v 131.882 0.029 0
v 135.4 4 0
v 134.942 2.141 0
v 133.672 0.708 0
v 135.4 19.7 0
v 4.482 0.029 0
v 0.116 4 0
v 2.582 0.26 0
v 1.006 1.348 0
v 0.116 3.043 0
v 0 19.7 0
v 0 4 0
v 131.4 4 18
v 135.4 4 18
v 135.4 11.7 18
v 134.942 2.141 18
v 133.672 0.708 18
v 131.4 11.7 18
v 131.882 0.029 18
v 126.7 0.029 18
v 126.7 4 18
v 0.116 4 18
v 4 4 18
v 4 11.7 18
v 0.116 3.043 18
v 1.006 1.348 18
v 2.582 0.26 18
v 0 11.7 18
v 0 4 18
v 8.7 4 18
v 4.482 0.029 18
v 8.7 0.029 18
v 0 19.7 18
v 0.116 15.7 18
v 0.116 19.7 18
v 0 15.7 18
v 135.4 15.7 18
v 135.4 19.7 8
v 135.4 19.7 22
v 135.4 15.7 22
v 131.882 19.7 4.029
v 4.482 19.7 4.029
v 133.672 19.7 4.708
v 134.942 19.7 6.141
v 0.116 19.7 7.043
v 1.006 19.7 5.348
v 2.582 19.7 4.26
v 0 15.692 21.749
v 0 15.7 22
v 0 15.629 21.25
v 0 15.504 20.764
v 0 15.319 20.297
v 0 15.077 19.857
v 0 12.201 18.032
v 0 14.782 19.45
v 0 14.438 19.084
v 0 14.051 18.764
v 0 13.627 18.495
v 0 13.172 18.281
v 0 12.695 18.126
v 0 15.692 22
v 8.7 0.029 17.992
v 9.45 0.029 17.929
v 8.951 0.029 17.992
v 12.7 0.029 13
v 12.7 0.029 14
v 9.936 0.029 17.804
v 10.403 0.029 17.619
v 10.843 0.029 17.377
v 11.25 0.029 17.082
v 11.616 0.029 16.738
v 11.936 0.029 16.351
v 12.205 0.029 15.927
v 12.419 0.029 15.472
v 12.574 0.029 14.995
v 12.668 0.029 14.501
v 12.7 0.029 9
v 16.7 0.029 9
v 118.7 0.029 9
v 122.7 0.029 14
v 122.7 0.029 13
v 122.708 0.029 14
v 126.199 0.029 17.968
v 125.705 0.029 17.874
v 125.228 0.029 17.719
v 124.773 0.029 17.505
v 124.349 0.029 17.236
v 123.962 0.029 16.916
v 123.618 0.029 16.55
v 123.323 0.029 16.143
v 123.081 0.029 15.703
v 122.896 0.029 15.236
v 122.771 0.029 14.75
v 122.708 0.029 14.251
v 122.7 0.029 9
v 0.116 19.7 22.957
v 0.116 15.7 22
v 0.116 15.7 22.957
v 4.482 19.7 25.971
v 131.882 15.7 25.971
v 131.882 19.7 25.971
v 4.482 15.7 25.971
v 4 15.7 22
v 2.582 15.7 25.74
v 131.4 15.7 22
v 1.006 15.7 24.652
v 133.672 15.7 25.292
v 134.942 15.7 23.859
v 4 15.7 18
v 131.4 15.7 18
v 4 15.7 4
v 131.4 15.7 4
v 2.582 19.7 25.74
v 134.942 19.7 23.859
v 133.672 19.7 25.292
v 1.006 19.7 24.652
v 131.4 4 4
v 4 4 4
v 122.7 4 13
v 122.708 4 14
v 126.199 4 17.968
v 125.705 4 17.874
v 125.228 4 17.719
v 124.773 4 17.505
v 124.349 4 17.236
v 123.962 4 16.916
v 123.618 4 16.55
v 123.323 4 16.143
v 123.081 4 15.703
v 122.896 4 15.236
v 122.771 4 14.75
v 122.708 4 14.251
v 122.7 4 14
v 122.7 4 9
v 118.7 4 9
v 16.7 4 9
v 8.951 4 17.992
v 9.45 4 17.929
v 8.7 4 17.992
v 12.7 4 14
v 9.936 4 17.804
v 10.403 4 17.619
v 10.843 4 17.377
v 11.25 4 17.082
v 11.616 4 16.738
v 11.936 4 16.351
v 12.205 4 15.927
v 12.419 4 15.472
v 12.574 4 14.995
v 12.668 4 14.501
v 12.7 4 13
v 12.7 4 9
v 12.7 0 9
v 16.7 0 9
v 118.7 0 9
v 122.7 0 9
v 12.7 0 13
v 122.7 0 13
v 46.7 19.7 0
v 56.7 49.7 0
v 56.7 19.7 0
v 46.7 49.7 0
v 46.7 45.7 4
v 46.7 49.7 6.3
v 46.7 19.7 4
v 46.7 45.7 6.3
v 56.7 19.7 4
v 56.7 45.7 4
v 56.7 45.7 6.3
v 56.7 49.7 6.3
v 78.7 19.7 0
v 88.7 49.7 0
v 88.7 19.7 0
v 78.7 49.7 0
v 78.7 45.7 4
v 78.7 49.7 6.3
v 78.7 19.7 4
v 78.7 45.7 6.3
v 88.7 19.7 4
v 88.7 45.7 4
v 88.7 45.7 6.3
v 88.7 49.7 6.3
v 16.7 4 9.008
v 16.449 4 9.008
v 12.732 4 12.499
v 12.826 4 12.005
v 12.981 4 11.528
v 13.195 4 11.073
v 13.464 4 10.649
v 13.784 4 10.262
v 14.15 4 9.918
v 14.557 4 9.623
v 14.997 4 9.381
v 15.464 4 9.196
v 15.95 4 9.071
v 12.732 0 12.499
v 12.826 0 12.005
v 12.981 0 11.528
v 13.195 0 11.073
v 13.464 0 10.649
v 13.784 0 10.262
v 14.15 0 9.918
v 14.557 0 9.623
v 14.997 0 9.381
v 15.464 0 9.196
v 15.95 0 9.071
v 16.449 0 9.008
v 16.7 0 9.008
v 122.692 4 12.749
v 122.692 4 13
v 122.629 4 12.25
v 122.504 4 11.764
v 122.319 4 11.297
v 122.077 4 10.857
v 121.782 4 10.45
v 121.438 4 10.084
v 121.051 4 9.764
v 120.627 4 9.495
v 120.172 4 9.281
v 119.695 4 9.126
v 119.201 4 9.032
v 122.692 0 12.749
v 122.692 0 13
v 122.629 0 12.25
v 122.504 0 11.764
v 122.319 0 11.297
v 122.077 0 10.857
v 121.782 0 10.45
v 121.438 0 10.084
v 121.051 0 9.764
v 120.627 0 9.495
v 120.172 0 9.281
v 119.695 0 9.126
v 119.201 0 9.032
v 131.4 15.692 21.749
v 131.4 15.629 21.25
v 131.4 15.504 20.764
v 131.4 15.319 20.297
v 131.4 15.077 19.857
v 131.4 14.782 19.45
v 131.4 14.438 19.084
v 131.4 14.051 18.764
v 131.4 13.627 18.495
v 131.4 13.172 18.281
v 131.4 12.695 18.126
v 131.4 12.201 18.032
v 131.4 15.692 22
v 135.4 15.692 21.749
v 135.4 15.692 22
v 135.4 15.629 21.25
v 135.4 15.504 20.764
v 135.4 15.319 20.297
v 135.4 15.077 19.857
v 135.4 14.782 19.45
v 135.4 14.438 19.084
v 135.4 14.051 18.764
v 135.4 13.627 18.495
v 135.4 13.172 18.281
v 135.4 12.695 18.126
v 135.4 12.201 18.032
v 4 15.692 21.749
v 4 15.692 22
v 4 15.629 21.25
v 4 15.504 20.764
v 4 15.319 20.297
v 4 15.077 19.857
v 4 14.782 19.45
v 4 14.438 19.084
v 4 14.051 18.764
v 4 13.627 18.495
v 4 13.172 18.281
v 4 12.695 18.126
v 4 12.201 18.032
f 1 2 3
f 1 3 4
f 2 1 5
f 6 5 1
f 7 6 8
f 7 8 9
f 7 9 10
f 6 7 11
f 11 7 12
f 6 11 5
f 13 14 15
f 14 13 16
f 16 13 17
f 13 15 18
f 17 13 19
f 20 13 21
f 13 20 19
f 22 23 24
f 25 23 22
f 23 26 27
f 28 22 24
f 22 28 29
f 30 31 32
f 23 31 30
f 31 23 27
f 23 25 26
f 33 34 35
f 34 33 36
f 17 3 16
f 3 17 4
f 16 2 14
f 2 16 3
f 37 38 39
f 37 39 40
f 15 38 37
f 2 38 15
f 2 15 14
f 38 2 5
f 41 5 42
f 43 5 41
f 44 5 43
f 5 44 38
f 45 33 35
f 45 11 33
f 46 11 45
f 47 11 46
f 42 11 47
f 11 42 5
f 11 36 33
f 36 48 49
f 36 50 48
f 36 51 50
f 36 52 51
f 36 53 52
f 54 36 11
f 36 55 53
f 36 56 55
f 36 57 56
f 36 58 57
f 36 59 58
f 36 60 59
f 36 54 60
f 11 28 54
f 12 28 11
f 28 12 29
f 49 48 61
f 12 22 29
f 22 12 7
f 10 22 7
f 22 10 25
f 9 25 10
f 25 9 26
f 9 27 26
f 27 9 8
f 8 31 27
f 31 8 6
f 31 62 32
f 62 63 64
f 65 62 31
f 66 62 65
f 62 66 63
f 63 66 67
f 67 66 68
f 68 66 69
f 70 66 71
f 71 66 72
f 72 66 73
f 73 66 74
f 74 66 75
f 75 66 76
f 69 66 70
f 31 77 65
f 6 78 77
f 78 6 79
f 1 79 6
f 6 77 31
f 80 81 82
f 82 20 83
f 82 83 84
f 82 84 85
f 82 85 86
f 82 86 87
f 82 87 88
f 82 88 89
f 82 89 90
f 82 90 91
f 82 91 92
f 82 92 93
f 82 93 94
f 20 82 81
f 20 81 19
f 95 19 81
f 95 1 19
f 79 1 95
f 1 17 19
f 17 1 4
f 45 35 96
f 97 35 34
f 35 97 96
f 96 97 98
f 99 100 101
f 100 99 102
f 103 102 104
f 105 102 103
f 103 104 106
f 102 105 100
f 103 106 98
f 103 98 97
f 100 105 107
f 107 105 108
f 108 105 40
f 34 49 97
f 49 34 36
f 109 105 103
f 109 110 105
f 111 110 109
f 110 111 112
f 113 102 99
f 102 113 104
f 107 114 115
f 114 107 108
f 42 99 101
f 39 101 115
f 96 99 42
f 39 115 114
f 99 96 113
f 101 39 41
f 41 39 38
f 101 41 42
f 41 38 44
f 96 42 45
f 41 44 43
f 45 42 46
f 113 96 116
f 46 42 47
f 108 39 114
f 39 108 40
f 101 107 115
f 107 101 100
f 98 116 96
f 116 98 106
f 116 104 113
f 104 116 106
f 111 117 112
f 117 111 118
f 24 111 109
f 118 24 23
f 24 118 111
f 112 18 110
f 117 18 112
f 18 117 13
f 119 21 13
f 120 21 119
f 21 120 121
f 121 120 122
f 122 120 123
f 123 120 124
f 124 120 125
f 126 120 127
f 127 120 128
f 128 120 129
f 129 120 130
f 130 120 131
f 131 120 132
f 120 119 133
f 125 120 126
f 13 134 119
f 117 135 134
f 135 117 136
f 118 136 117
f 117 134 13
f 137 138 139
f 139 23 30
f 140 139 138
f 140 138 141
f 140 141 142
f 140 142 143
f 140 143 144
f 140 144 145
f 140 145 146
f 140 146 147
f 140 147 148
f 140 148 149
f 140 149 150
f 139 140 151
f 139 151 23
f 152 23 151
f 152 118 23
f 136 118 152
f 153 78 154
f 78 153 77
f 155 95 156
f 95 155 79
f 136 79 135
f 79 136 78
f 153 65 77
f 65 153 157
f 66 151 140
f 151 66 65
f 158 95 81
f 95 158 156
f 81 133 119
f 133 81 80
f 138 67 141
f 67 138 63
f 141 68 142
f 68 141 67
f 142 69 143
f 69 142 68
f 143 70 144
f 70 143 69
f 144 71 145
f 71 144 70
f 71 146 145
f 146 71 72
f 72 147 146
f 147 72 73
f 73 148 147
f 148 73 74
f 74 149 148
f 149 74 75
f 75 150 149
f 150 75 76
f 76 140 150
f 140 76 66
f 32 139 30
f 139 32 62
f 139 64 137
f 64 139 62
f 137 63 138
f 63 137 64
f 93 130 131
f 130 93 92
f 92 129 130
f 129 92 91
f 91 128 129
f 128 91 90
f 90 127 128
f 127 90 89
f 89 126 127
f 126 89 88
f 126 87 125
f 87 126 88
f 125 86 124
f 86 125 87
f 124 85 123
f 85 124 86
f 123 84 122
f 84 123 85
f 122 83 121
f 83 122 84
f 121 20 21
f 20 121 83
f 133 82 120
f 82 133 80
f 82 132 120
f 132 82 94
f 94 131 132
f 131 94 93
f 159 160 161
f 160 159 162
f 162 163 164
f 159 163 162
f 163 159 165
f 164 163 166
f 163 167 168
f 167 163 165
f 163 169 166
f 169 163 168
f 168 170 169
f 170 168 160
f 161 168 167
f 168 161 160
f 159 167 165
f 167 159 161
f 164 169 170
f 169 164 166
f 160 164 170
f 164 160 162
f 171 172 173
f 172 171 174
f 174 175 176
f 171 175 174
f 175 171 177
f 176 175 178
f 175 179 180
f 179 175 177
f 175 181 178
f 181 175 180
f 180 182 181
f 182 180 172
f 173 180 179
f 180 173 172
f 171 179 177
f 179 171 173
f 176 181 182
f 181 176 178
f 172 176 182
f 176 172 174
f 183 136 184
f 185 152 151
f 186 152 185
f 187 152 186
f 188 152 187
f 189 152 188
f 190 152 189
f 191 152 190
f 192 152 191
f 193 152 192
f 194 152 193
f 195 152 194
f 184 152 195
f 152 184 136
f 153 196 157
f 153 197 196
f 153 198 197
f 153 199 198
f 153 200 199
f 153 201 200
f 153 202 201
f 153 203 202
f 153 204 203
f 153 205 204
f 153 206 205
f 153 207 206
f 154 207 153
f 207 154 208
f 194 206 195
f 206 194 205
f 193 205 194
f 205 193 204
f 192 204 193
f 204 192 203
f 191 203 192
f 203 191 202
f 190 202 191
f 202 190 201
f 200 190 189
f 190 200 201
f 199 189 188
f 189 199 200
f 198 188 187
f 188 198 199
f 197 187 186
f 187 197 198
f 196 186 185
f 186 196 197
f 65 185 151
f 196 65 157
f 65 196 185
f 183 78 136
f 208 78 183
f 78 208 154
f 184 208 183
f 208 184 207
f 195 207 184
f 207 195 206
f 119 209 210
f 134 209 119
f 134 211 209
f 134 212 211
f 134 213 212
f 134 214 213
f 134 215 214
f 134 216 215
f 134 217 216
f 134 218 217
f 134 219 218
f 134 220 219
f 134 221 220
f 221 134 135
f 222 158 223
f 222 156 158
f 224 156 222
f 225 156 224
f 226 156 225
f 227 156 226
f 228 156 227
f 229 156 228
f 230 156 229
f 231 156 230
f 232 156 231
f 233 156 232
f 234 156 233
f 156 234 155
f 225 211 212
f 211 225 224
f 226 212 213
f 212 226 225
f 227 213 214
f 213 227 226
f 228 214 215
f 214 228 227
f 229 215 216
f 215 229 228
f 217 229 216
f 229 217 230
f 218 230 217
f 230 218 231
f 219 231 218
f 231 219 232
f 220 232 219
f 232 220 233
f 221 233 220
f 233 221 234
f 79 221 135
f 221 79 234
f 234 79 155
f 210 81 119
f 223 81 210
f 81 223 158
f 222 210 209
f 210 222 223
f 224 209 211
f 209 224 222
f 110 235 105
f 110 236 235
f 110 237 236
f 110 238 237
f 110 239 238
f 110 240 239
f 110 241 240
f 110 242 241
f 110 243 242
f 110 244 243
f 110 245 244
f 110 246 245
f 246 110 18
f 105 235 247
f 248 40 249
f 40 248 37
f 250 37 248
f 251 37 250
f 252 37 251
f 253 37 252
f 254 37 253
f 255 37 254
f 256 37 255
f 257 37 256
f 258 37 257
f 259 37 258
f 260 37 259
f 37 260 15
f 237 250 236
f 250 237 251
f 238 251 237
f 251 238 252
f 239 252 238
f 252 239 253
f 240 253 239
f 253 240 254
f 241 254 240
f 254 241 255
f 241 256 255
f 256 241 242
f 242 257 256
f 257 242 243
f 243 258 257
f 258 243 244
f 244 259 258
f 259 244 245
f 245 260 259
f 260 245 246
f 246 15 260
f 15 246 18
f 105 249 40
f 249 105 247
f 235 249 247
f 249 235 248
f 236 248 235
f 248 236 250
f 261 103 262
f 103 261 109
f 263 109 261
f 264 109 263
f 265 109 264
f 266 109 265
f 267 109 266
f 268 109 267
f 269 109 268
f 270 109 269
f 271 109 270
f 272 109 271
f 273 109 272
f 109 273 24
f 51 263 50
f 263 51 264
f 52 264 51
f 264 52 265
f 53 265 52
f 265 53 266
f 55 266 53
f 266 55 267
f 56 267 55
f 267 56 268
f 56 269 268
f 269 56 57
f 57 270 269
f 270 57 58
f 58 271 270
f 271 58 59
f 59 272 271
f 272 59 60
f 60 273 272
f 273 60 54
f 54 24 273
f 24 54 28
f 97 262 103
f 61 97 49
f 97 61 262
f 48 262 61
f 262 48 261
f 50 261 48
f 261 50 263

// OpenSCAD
thickness = 4;

iphone_size = [
    127.4,
    11.7
];

base_size = [
    iphone_size.x + 2*thickness,
    iphone_size.y + 2*thickness,
    18
];

back_size = [
    base_size.x,
    thickness,
    14
];

back_pos = [
    0,
    base_size.y-thickness,
    26-back_size.z-2*thickness
];

cut1_size = [
    iphone_size.x,
    iphone_size.y,
    base_size.z
];

cut1_pos = [
    thickness,
    thickness,
    thickness
];

cut2_size = [
    110,
    2*thickness,
    base_size.z
];

cut2_pos = [
    (base_size.x-cut2_size.x)/2,
    -thickness/2,
    9
];

holder_stick_size = [
    10,
    26,
    thickness
];

holder_end_size = [
    holder_stick_size.x,
    thickness,
    6.3
];

holder1_pos = [
    base_size.x/2-11-10,
    base_size.y,
    0
];

holder2_pos = [
    base_size.x/2+11,
    base_size.y,
    0
];

diff_corner1_pos = [
    (base_size.x-cut2_size.x)/2-thickness,
    thickness,
    base_size.z-thickness
];

diff_corner1_rot = [
    90,
    0,
    0
];

diff_corner2_pos = [
    (base_size.x+cut2_size.x)/2+thickness,
    thickness,
    base_size.z-thickness
];

diff_corner2_rot = [
    90,
    -90,
    0
];

corner1_pos = [
    (base_size.x-cut2_size.x)/2+thickness,
    thickness,
    cut2_pos.z+thickness
];

corner1_rot = [
    90,
    180,
    0
];

corner2_pos = [
    (base_size.x+cut2_size.x)/2-thickness,
    thickness,
    cut2_pos.z+thickness
];

corner2_rot = [
    90,
    90,
    0
];

corner3_pos = [
    base_size.x-thickness,
    base_size.y-2*thickness,
    base_size.z+thickness
];

corner3_rot = [
    90,
    90,
    90
];

corner4_pos = [
    0,
    base_size.y-2*thickness,
    base_size.z+thickness
];

corner4_rot = [
    90,
    90,
    90
];

module corner(a) {
    difference() {
        $fn = 50;
        square(a);
        intersection() {
            circle(a);
            square(a);
        };
    };
};

module holder() {
    box(holder_stick_size);
    translate(
        [
            0,
            holder_stick_size.y,
            0
        ]
    )
    box(holder_end_size);
};

module box(size) {
    linear_extrude(height=size.z)
    square([size.x, size.y]);
};

module back() {
    rotate([90, 0, 0])
    translate([
        thickness,
        thickness,
        -thickness
    ])
    linear_extrude(height=back_size.y)
    minkowski() {
        circle(thickness);
        square(
            [
                back_size.x-2*thickness,
                back_size.z
            ]
        );
    }
};

module base() {
    linear_extrude(height=base_size.z)
    translate([
        0,
        thickness
    ]) {
        square(
            [
                base_size.x,
                base_size.y-thickness,
            ]
        );
        
        translate([
            thickness,
            0
        ])
        minkowski() {
            circle(thickness);
            square(
                [
                    base_size.x-2*thickness,
                    base_size.y-2*thickness,
                ]
            );
        };
    }
}

difference() {
    union() {
        base();
        translate(
            back_pos
        )
        back();
    };
    
    translate(cut1_pos)
    box(cut1_size);
    
    translate(cut2_pos)
    box(cut2_size);
    
    translate(diff_corner1_pos)
    rotate(diff_corner1_rot)
    linear_extrude(thickness)
    corner(thickness);
    
    translate(diff_corner2_pos)
    rotate(diff_corner2_rot)
    linear_extrude(thickness)
    corner(thickness);
        
}

translate(holder1_pos)
holder();

translate(holder2_pos)
holder();

translate(corner1_pos)
rotate(corner1_rot)
linear_extrude(thickness)
corner(thickness);

translate(corner2_pos)
rotate(corner2_rot)
linear_extrude(thickness)
corner(thickness);

translate(corner3_pos)
rotate(corner3_rot)
linear_extrude(thickness)
corner(thickness);

translate(corner4_pos)
rotate(corner4_rot)
linear_extrude(thickness)
corner(thickness);
